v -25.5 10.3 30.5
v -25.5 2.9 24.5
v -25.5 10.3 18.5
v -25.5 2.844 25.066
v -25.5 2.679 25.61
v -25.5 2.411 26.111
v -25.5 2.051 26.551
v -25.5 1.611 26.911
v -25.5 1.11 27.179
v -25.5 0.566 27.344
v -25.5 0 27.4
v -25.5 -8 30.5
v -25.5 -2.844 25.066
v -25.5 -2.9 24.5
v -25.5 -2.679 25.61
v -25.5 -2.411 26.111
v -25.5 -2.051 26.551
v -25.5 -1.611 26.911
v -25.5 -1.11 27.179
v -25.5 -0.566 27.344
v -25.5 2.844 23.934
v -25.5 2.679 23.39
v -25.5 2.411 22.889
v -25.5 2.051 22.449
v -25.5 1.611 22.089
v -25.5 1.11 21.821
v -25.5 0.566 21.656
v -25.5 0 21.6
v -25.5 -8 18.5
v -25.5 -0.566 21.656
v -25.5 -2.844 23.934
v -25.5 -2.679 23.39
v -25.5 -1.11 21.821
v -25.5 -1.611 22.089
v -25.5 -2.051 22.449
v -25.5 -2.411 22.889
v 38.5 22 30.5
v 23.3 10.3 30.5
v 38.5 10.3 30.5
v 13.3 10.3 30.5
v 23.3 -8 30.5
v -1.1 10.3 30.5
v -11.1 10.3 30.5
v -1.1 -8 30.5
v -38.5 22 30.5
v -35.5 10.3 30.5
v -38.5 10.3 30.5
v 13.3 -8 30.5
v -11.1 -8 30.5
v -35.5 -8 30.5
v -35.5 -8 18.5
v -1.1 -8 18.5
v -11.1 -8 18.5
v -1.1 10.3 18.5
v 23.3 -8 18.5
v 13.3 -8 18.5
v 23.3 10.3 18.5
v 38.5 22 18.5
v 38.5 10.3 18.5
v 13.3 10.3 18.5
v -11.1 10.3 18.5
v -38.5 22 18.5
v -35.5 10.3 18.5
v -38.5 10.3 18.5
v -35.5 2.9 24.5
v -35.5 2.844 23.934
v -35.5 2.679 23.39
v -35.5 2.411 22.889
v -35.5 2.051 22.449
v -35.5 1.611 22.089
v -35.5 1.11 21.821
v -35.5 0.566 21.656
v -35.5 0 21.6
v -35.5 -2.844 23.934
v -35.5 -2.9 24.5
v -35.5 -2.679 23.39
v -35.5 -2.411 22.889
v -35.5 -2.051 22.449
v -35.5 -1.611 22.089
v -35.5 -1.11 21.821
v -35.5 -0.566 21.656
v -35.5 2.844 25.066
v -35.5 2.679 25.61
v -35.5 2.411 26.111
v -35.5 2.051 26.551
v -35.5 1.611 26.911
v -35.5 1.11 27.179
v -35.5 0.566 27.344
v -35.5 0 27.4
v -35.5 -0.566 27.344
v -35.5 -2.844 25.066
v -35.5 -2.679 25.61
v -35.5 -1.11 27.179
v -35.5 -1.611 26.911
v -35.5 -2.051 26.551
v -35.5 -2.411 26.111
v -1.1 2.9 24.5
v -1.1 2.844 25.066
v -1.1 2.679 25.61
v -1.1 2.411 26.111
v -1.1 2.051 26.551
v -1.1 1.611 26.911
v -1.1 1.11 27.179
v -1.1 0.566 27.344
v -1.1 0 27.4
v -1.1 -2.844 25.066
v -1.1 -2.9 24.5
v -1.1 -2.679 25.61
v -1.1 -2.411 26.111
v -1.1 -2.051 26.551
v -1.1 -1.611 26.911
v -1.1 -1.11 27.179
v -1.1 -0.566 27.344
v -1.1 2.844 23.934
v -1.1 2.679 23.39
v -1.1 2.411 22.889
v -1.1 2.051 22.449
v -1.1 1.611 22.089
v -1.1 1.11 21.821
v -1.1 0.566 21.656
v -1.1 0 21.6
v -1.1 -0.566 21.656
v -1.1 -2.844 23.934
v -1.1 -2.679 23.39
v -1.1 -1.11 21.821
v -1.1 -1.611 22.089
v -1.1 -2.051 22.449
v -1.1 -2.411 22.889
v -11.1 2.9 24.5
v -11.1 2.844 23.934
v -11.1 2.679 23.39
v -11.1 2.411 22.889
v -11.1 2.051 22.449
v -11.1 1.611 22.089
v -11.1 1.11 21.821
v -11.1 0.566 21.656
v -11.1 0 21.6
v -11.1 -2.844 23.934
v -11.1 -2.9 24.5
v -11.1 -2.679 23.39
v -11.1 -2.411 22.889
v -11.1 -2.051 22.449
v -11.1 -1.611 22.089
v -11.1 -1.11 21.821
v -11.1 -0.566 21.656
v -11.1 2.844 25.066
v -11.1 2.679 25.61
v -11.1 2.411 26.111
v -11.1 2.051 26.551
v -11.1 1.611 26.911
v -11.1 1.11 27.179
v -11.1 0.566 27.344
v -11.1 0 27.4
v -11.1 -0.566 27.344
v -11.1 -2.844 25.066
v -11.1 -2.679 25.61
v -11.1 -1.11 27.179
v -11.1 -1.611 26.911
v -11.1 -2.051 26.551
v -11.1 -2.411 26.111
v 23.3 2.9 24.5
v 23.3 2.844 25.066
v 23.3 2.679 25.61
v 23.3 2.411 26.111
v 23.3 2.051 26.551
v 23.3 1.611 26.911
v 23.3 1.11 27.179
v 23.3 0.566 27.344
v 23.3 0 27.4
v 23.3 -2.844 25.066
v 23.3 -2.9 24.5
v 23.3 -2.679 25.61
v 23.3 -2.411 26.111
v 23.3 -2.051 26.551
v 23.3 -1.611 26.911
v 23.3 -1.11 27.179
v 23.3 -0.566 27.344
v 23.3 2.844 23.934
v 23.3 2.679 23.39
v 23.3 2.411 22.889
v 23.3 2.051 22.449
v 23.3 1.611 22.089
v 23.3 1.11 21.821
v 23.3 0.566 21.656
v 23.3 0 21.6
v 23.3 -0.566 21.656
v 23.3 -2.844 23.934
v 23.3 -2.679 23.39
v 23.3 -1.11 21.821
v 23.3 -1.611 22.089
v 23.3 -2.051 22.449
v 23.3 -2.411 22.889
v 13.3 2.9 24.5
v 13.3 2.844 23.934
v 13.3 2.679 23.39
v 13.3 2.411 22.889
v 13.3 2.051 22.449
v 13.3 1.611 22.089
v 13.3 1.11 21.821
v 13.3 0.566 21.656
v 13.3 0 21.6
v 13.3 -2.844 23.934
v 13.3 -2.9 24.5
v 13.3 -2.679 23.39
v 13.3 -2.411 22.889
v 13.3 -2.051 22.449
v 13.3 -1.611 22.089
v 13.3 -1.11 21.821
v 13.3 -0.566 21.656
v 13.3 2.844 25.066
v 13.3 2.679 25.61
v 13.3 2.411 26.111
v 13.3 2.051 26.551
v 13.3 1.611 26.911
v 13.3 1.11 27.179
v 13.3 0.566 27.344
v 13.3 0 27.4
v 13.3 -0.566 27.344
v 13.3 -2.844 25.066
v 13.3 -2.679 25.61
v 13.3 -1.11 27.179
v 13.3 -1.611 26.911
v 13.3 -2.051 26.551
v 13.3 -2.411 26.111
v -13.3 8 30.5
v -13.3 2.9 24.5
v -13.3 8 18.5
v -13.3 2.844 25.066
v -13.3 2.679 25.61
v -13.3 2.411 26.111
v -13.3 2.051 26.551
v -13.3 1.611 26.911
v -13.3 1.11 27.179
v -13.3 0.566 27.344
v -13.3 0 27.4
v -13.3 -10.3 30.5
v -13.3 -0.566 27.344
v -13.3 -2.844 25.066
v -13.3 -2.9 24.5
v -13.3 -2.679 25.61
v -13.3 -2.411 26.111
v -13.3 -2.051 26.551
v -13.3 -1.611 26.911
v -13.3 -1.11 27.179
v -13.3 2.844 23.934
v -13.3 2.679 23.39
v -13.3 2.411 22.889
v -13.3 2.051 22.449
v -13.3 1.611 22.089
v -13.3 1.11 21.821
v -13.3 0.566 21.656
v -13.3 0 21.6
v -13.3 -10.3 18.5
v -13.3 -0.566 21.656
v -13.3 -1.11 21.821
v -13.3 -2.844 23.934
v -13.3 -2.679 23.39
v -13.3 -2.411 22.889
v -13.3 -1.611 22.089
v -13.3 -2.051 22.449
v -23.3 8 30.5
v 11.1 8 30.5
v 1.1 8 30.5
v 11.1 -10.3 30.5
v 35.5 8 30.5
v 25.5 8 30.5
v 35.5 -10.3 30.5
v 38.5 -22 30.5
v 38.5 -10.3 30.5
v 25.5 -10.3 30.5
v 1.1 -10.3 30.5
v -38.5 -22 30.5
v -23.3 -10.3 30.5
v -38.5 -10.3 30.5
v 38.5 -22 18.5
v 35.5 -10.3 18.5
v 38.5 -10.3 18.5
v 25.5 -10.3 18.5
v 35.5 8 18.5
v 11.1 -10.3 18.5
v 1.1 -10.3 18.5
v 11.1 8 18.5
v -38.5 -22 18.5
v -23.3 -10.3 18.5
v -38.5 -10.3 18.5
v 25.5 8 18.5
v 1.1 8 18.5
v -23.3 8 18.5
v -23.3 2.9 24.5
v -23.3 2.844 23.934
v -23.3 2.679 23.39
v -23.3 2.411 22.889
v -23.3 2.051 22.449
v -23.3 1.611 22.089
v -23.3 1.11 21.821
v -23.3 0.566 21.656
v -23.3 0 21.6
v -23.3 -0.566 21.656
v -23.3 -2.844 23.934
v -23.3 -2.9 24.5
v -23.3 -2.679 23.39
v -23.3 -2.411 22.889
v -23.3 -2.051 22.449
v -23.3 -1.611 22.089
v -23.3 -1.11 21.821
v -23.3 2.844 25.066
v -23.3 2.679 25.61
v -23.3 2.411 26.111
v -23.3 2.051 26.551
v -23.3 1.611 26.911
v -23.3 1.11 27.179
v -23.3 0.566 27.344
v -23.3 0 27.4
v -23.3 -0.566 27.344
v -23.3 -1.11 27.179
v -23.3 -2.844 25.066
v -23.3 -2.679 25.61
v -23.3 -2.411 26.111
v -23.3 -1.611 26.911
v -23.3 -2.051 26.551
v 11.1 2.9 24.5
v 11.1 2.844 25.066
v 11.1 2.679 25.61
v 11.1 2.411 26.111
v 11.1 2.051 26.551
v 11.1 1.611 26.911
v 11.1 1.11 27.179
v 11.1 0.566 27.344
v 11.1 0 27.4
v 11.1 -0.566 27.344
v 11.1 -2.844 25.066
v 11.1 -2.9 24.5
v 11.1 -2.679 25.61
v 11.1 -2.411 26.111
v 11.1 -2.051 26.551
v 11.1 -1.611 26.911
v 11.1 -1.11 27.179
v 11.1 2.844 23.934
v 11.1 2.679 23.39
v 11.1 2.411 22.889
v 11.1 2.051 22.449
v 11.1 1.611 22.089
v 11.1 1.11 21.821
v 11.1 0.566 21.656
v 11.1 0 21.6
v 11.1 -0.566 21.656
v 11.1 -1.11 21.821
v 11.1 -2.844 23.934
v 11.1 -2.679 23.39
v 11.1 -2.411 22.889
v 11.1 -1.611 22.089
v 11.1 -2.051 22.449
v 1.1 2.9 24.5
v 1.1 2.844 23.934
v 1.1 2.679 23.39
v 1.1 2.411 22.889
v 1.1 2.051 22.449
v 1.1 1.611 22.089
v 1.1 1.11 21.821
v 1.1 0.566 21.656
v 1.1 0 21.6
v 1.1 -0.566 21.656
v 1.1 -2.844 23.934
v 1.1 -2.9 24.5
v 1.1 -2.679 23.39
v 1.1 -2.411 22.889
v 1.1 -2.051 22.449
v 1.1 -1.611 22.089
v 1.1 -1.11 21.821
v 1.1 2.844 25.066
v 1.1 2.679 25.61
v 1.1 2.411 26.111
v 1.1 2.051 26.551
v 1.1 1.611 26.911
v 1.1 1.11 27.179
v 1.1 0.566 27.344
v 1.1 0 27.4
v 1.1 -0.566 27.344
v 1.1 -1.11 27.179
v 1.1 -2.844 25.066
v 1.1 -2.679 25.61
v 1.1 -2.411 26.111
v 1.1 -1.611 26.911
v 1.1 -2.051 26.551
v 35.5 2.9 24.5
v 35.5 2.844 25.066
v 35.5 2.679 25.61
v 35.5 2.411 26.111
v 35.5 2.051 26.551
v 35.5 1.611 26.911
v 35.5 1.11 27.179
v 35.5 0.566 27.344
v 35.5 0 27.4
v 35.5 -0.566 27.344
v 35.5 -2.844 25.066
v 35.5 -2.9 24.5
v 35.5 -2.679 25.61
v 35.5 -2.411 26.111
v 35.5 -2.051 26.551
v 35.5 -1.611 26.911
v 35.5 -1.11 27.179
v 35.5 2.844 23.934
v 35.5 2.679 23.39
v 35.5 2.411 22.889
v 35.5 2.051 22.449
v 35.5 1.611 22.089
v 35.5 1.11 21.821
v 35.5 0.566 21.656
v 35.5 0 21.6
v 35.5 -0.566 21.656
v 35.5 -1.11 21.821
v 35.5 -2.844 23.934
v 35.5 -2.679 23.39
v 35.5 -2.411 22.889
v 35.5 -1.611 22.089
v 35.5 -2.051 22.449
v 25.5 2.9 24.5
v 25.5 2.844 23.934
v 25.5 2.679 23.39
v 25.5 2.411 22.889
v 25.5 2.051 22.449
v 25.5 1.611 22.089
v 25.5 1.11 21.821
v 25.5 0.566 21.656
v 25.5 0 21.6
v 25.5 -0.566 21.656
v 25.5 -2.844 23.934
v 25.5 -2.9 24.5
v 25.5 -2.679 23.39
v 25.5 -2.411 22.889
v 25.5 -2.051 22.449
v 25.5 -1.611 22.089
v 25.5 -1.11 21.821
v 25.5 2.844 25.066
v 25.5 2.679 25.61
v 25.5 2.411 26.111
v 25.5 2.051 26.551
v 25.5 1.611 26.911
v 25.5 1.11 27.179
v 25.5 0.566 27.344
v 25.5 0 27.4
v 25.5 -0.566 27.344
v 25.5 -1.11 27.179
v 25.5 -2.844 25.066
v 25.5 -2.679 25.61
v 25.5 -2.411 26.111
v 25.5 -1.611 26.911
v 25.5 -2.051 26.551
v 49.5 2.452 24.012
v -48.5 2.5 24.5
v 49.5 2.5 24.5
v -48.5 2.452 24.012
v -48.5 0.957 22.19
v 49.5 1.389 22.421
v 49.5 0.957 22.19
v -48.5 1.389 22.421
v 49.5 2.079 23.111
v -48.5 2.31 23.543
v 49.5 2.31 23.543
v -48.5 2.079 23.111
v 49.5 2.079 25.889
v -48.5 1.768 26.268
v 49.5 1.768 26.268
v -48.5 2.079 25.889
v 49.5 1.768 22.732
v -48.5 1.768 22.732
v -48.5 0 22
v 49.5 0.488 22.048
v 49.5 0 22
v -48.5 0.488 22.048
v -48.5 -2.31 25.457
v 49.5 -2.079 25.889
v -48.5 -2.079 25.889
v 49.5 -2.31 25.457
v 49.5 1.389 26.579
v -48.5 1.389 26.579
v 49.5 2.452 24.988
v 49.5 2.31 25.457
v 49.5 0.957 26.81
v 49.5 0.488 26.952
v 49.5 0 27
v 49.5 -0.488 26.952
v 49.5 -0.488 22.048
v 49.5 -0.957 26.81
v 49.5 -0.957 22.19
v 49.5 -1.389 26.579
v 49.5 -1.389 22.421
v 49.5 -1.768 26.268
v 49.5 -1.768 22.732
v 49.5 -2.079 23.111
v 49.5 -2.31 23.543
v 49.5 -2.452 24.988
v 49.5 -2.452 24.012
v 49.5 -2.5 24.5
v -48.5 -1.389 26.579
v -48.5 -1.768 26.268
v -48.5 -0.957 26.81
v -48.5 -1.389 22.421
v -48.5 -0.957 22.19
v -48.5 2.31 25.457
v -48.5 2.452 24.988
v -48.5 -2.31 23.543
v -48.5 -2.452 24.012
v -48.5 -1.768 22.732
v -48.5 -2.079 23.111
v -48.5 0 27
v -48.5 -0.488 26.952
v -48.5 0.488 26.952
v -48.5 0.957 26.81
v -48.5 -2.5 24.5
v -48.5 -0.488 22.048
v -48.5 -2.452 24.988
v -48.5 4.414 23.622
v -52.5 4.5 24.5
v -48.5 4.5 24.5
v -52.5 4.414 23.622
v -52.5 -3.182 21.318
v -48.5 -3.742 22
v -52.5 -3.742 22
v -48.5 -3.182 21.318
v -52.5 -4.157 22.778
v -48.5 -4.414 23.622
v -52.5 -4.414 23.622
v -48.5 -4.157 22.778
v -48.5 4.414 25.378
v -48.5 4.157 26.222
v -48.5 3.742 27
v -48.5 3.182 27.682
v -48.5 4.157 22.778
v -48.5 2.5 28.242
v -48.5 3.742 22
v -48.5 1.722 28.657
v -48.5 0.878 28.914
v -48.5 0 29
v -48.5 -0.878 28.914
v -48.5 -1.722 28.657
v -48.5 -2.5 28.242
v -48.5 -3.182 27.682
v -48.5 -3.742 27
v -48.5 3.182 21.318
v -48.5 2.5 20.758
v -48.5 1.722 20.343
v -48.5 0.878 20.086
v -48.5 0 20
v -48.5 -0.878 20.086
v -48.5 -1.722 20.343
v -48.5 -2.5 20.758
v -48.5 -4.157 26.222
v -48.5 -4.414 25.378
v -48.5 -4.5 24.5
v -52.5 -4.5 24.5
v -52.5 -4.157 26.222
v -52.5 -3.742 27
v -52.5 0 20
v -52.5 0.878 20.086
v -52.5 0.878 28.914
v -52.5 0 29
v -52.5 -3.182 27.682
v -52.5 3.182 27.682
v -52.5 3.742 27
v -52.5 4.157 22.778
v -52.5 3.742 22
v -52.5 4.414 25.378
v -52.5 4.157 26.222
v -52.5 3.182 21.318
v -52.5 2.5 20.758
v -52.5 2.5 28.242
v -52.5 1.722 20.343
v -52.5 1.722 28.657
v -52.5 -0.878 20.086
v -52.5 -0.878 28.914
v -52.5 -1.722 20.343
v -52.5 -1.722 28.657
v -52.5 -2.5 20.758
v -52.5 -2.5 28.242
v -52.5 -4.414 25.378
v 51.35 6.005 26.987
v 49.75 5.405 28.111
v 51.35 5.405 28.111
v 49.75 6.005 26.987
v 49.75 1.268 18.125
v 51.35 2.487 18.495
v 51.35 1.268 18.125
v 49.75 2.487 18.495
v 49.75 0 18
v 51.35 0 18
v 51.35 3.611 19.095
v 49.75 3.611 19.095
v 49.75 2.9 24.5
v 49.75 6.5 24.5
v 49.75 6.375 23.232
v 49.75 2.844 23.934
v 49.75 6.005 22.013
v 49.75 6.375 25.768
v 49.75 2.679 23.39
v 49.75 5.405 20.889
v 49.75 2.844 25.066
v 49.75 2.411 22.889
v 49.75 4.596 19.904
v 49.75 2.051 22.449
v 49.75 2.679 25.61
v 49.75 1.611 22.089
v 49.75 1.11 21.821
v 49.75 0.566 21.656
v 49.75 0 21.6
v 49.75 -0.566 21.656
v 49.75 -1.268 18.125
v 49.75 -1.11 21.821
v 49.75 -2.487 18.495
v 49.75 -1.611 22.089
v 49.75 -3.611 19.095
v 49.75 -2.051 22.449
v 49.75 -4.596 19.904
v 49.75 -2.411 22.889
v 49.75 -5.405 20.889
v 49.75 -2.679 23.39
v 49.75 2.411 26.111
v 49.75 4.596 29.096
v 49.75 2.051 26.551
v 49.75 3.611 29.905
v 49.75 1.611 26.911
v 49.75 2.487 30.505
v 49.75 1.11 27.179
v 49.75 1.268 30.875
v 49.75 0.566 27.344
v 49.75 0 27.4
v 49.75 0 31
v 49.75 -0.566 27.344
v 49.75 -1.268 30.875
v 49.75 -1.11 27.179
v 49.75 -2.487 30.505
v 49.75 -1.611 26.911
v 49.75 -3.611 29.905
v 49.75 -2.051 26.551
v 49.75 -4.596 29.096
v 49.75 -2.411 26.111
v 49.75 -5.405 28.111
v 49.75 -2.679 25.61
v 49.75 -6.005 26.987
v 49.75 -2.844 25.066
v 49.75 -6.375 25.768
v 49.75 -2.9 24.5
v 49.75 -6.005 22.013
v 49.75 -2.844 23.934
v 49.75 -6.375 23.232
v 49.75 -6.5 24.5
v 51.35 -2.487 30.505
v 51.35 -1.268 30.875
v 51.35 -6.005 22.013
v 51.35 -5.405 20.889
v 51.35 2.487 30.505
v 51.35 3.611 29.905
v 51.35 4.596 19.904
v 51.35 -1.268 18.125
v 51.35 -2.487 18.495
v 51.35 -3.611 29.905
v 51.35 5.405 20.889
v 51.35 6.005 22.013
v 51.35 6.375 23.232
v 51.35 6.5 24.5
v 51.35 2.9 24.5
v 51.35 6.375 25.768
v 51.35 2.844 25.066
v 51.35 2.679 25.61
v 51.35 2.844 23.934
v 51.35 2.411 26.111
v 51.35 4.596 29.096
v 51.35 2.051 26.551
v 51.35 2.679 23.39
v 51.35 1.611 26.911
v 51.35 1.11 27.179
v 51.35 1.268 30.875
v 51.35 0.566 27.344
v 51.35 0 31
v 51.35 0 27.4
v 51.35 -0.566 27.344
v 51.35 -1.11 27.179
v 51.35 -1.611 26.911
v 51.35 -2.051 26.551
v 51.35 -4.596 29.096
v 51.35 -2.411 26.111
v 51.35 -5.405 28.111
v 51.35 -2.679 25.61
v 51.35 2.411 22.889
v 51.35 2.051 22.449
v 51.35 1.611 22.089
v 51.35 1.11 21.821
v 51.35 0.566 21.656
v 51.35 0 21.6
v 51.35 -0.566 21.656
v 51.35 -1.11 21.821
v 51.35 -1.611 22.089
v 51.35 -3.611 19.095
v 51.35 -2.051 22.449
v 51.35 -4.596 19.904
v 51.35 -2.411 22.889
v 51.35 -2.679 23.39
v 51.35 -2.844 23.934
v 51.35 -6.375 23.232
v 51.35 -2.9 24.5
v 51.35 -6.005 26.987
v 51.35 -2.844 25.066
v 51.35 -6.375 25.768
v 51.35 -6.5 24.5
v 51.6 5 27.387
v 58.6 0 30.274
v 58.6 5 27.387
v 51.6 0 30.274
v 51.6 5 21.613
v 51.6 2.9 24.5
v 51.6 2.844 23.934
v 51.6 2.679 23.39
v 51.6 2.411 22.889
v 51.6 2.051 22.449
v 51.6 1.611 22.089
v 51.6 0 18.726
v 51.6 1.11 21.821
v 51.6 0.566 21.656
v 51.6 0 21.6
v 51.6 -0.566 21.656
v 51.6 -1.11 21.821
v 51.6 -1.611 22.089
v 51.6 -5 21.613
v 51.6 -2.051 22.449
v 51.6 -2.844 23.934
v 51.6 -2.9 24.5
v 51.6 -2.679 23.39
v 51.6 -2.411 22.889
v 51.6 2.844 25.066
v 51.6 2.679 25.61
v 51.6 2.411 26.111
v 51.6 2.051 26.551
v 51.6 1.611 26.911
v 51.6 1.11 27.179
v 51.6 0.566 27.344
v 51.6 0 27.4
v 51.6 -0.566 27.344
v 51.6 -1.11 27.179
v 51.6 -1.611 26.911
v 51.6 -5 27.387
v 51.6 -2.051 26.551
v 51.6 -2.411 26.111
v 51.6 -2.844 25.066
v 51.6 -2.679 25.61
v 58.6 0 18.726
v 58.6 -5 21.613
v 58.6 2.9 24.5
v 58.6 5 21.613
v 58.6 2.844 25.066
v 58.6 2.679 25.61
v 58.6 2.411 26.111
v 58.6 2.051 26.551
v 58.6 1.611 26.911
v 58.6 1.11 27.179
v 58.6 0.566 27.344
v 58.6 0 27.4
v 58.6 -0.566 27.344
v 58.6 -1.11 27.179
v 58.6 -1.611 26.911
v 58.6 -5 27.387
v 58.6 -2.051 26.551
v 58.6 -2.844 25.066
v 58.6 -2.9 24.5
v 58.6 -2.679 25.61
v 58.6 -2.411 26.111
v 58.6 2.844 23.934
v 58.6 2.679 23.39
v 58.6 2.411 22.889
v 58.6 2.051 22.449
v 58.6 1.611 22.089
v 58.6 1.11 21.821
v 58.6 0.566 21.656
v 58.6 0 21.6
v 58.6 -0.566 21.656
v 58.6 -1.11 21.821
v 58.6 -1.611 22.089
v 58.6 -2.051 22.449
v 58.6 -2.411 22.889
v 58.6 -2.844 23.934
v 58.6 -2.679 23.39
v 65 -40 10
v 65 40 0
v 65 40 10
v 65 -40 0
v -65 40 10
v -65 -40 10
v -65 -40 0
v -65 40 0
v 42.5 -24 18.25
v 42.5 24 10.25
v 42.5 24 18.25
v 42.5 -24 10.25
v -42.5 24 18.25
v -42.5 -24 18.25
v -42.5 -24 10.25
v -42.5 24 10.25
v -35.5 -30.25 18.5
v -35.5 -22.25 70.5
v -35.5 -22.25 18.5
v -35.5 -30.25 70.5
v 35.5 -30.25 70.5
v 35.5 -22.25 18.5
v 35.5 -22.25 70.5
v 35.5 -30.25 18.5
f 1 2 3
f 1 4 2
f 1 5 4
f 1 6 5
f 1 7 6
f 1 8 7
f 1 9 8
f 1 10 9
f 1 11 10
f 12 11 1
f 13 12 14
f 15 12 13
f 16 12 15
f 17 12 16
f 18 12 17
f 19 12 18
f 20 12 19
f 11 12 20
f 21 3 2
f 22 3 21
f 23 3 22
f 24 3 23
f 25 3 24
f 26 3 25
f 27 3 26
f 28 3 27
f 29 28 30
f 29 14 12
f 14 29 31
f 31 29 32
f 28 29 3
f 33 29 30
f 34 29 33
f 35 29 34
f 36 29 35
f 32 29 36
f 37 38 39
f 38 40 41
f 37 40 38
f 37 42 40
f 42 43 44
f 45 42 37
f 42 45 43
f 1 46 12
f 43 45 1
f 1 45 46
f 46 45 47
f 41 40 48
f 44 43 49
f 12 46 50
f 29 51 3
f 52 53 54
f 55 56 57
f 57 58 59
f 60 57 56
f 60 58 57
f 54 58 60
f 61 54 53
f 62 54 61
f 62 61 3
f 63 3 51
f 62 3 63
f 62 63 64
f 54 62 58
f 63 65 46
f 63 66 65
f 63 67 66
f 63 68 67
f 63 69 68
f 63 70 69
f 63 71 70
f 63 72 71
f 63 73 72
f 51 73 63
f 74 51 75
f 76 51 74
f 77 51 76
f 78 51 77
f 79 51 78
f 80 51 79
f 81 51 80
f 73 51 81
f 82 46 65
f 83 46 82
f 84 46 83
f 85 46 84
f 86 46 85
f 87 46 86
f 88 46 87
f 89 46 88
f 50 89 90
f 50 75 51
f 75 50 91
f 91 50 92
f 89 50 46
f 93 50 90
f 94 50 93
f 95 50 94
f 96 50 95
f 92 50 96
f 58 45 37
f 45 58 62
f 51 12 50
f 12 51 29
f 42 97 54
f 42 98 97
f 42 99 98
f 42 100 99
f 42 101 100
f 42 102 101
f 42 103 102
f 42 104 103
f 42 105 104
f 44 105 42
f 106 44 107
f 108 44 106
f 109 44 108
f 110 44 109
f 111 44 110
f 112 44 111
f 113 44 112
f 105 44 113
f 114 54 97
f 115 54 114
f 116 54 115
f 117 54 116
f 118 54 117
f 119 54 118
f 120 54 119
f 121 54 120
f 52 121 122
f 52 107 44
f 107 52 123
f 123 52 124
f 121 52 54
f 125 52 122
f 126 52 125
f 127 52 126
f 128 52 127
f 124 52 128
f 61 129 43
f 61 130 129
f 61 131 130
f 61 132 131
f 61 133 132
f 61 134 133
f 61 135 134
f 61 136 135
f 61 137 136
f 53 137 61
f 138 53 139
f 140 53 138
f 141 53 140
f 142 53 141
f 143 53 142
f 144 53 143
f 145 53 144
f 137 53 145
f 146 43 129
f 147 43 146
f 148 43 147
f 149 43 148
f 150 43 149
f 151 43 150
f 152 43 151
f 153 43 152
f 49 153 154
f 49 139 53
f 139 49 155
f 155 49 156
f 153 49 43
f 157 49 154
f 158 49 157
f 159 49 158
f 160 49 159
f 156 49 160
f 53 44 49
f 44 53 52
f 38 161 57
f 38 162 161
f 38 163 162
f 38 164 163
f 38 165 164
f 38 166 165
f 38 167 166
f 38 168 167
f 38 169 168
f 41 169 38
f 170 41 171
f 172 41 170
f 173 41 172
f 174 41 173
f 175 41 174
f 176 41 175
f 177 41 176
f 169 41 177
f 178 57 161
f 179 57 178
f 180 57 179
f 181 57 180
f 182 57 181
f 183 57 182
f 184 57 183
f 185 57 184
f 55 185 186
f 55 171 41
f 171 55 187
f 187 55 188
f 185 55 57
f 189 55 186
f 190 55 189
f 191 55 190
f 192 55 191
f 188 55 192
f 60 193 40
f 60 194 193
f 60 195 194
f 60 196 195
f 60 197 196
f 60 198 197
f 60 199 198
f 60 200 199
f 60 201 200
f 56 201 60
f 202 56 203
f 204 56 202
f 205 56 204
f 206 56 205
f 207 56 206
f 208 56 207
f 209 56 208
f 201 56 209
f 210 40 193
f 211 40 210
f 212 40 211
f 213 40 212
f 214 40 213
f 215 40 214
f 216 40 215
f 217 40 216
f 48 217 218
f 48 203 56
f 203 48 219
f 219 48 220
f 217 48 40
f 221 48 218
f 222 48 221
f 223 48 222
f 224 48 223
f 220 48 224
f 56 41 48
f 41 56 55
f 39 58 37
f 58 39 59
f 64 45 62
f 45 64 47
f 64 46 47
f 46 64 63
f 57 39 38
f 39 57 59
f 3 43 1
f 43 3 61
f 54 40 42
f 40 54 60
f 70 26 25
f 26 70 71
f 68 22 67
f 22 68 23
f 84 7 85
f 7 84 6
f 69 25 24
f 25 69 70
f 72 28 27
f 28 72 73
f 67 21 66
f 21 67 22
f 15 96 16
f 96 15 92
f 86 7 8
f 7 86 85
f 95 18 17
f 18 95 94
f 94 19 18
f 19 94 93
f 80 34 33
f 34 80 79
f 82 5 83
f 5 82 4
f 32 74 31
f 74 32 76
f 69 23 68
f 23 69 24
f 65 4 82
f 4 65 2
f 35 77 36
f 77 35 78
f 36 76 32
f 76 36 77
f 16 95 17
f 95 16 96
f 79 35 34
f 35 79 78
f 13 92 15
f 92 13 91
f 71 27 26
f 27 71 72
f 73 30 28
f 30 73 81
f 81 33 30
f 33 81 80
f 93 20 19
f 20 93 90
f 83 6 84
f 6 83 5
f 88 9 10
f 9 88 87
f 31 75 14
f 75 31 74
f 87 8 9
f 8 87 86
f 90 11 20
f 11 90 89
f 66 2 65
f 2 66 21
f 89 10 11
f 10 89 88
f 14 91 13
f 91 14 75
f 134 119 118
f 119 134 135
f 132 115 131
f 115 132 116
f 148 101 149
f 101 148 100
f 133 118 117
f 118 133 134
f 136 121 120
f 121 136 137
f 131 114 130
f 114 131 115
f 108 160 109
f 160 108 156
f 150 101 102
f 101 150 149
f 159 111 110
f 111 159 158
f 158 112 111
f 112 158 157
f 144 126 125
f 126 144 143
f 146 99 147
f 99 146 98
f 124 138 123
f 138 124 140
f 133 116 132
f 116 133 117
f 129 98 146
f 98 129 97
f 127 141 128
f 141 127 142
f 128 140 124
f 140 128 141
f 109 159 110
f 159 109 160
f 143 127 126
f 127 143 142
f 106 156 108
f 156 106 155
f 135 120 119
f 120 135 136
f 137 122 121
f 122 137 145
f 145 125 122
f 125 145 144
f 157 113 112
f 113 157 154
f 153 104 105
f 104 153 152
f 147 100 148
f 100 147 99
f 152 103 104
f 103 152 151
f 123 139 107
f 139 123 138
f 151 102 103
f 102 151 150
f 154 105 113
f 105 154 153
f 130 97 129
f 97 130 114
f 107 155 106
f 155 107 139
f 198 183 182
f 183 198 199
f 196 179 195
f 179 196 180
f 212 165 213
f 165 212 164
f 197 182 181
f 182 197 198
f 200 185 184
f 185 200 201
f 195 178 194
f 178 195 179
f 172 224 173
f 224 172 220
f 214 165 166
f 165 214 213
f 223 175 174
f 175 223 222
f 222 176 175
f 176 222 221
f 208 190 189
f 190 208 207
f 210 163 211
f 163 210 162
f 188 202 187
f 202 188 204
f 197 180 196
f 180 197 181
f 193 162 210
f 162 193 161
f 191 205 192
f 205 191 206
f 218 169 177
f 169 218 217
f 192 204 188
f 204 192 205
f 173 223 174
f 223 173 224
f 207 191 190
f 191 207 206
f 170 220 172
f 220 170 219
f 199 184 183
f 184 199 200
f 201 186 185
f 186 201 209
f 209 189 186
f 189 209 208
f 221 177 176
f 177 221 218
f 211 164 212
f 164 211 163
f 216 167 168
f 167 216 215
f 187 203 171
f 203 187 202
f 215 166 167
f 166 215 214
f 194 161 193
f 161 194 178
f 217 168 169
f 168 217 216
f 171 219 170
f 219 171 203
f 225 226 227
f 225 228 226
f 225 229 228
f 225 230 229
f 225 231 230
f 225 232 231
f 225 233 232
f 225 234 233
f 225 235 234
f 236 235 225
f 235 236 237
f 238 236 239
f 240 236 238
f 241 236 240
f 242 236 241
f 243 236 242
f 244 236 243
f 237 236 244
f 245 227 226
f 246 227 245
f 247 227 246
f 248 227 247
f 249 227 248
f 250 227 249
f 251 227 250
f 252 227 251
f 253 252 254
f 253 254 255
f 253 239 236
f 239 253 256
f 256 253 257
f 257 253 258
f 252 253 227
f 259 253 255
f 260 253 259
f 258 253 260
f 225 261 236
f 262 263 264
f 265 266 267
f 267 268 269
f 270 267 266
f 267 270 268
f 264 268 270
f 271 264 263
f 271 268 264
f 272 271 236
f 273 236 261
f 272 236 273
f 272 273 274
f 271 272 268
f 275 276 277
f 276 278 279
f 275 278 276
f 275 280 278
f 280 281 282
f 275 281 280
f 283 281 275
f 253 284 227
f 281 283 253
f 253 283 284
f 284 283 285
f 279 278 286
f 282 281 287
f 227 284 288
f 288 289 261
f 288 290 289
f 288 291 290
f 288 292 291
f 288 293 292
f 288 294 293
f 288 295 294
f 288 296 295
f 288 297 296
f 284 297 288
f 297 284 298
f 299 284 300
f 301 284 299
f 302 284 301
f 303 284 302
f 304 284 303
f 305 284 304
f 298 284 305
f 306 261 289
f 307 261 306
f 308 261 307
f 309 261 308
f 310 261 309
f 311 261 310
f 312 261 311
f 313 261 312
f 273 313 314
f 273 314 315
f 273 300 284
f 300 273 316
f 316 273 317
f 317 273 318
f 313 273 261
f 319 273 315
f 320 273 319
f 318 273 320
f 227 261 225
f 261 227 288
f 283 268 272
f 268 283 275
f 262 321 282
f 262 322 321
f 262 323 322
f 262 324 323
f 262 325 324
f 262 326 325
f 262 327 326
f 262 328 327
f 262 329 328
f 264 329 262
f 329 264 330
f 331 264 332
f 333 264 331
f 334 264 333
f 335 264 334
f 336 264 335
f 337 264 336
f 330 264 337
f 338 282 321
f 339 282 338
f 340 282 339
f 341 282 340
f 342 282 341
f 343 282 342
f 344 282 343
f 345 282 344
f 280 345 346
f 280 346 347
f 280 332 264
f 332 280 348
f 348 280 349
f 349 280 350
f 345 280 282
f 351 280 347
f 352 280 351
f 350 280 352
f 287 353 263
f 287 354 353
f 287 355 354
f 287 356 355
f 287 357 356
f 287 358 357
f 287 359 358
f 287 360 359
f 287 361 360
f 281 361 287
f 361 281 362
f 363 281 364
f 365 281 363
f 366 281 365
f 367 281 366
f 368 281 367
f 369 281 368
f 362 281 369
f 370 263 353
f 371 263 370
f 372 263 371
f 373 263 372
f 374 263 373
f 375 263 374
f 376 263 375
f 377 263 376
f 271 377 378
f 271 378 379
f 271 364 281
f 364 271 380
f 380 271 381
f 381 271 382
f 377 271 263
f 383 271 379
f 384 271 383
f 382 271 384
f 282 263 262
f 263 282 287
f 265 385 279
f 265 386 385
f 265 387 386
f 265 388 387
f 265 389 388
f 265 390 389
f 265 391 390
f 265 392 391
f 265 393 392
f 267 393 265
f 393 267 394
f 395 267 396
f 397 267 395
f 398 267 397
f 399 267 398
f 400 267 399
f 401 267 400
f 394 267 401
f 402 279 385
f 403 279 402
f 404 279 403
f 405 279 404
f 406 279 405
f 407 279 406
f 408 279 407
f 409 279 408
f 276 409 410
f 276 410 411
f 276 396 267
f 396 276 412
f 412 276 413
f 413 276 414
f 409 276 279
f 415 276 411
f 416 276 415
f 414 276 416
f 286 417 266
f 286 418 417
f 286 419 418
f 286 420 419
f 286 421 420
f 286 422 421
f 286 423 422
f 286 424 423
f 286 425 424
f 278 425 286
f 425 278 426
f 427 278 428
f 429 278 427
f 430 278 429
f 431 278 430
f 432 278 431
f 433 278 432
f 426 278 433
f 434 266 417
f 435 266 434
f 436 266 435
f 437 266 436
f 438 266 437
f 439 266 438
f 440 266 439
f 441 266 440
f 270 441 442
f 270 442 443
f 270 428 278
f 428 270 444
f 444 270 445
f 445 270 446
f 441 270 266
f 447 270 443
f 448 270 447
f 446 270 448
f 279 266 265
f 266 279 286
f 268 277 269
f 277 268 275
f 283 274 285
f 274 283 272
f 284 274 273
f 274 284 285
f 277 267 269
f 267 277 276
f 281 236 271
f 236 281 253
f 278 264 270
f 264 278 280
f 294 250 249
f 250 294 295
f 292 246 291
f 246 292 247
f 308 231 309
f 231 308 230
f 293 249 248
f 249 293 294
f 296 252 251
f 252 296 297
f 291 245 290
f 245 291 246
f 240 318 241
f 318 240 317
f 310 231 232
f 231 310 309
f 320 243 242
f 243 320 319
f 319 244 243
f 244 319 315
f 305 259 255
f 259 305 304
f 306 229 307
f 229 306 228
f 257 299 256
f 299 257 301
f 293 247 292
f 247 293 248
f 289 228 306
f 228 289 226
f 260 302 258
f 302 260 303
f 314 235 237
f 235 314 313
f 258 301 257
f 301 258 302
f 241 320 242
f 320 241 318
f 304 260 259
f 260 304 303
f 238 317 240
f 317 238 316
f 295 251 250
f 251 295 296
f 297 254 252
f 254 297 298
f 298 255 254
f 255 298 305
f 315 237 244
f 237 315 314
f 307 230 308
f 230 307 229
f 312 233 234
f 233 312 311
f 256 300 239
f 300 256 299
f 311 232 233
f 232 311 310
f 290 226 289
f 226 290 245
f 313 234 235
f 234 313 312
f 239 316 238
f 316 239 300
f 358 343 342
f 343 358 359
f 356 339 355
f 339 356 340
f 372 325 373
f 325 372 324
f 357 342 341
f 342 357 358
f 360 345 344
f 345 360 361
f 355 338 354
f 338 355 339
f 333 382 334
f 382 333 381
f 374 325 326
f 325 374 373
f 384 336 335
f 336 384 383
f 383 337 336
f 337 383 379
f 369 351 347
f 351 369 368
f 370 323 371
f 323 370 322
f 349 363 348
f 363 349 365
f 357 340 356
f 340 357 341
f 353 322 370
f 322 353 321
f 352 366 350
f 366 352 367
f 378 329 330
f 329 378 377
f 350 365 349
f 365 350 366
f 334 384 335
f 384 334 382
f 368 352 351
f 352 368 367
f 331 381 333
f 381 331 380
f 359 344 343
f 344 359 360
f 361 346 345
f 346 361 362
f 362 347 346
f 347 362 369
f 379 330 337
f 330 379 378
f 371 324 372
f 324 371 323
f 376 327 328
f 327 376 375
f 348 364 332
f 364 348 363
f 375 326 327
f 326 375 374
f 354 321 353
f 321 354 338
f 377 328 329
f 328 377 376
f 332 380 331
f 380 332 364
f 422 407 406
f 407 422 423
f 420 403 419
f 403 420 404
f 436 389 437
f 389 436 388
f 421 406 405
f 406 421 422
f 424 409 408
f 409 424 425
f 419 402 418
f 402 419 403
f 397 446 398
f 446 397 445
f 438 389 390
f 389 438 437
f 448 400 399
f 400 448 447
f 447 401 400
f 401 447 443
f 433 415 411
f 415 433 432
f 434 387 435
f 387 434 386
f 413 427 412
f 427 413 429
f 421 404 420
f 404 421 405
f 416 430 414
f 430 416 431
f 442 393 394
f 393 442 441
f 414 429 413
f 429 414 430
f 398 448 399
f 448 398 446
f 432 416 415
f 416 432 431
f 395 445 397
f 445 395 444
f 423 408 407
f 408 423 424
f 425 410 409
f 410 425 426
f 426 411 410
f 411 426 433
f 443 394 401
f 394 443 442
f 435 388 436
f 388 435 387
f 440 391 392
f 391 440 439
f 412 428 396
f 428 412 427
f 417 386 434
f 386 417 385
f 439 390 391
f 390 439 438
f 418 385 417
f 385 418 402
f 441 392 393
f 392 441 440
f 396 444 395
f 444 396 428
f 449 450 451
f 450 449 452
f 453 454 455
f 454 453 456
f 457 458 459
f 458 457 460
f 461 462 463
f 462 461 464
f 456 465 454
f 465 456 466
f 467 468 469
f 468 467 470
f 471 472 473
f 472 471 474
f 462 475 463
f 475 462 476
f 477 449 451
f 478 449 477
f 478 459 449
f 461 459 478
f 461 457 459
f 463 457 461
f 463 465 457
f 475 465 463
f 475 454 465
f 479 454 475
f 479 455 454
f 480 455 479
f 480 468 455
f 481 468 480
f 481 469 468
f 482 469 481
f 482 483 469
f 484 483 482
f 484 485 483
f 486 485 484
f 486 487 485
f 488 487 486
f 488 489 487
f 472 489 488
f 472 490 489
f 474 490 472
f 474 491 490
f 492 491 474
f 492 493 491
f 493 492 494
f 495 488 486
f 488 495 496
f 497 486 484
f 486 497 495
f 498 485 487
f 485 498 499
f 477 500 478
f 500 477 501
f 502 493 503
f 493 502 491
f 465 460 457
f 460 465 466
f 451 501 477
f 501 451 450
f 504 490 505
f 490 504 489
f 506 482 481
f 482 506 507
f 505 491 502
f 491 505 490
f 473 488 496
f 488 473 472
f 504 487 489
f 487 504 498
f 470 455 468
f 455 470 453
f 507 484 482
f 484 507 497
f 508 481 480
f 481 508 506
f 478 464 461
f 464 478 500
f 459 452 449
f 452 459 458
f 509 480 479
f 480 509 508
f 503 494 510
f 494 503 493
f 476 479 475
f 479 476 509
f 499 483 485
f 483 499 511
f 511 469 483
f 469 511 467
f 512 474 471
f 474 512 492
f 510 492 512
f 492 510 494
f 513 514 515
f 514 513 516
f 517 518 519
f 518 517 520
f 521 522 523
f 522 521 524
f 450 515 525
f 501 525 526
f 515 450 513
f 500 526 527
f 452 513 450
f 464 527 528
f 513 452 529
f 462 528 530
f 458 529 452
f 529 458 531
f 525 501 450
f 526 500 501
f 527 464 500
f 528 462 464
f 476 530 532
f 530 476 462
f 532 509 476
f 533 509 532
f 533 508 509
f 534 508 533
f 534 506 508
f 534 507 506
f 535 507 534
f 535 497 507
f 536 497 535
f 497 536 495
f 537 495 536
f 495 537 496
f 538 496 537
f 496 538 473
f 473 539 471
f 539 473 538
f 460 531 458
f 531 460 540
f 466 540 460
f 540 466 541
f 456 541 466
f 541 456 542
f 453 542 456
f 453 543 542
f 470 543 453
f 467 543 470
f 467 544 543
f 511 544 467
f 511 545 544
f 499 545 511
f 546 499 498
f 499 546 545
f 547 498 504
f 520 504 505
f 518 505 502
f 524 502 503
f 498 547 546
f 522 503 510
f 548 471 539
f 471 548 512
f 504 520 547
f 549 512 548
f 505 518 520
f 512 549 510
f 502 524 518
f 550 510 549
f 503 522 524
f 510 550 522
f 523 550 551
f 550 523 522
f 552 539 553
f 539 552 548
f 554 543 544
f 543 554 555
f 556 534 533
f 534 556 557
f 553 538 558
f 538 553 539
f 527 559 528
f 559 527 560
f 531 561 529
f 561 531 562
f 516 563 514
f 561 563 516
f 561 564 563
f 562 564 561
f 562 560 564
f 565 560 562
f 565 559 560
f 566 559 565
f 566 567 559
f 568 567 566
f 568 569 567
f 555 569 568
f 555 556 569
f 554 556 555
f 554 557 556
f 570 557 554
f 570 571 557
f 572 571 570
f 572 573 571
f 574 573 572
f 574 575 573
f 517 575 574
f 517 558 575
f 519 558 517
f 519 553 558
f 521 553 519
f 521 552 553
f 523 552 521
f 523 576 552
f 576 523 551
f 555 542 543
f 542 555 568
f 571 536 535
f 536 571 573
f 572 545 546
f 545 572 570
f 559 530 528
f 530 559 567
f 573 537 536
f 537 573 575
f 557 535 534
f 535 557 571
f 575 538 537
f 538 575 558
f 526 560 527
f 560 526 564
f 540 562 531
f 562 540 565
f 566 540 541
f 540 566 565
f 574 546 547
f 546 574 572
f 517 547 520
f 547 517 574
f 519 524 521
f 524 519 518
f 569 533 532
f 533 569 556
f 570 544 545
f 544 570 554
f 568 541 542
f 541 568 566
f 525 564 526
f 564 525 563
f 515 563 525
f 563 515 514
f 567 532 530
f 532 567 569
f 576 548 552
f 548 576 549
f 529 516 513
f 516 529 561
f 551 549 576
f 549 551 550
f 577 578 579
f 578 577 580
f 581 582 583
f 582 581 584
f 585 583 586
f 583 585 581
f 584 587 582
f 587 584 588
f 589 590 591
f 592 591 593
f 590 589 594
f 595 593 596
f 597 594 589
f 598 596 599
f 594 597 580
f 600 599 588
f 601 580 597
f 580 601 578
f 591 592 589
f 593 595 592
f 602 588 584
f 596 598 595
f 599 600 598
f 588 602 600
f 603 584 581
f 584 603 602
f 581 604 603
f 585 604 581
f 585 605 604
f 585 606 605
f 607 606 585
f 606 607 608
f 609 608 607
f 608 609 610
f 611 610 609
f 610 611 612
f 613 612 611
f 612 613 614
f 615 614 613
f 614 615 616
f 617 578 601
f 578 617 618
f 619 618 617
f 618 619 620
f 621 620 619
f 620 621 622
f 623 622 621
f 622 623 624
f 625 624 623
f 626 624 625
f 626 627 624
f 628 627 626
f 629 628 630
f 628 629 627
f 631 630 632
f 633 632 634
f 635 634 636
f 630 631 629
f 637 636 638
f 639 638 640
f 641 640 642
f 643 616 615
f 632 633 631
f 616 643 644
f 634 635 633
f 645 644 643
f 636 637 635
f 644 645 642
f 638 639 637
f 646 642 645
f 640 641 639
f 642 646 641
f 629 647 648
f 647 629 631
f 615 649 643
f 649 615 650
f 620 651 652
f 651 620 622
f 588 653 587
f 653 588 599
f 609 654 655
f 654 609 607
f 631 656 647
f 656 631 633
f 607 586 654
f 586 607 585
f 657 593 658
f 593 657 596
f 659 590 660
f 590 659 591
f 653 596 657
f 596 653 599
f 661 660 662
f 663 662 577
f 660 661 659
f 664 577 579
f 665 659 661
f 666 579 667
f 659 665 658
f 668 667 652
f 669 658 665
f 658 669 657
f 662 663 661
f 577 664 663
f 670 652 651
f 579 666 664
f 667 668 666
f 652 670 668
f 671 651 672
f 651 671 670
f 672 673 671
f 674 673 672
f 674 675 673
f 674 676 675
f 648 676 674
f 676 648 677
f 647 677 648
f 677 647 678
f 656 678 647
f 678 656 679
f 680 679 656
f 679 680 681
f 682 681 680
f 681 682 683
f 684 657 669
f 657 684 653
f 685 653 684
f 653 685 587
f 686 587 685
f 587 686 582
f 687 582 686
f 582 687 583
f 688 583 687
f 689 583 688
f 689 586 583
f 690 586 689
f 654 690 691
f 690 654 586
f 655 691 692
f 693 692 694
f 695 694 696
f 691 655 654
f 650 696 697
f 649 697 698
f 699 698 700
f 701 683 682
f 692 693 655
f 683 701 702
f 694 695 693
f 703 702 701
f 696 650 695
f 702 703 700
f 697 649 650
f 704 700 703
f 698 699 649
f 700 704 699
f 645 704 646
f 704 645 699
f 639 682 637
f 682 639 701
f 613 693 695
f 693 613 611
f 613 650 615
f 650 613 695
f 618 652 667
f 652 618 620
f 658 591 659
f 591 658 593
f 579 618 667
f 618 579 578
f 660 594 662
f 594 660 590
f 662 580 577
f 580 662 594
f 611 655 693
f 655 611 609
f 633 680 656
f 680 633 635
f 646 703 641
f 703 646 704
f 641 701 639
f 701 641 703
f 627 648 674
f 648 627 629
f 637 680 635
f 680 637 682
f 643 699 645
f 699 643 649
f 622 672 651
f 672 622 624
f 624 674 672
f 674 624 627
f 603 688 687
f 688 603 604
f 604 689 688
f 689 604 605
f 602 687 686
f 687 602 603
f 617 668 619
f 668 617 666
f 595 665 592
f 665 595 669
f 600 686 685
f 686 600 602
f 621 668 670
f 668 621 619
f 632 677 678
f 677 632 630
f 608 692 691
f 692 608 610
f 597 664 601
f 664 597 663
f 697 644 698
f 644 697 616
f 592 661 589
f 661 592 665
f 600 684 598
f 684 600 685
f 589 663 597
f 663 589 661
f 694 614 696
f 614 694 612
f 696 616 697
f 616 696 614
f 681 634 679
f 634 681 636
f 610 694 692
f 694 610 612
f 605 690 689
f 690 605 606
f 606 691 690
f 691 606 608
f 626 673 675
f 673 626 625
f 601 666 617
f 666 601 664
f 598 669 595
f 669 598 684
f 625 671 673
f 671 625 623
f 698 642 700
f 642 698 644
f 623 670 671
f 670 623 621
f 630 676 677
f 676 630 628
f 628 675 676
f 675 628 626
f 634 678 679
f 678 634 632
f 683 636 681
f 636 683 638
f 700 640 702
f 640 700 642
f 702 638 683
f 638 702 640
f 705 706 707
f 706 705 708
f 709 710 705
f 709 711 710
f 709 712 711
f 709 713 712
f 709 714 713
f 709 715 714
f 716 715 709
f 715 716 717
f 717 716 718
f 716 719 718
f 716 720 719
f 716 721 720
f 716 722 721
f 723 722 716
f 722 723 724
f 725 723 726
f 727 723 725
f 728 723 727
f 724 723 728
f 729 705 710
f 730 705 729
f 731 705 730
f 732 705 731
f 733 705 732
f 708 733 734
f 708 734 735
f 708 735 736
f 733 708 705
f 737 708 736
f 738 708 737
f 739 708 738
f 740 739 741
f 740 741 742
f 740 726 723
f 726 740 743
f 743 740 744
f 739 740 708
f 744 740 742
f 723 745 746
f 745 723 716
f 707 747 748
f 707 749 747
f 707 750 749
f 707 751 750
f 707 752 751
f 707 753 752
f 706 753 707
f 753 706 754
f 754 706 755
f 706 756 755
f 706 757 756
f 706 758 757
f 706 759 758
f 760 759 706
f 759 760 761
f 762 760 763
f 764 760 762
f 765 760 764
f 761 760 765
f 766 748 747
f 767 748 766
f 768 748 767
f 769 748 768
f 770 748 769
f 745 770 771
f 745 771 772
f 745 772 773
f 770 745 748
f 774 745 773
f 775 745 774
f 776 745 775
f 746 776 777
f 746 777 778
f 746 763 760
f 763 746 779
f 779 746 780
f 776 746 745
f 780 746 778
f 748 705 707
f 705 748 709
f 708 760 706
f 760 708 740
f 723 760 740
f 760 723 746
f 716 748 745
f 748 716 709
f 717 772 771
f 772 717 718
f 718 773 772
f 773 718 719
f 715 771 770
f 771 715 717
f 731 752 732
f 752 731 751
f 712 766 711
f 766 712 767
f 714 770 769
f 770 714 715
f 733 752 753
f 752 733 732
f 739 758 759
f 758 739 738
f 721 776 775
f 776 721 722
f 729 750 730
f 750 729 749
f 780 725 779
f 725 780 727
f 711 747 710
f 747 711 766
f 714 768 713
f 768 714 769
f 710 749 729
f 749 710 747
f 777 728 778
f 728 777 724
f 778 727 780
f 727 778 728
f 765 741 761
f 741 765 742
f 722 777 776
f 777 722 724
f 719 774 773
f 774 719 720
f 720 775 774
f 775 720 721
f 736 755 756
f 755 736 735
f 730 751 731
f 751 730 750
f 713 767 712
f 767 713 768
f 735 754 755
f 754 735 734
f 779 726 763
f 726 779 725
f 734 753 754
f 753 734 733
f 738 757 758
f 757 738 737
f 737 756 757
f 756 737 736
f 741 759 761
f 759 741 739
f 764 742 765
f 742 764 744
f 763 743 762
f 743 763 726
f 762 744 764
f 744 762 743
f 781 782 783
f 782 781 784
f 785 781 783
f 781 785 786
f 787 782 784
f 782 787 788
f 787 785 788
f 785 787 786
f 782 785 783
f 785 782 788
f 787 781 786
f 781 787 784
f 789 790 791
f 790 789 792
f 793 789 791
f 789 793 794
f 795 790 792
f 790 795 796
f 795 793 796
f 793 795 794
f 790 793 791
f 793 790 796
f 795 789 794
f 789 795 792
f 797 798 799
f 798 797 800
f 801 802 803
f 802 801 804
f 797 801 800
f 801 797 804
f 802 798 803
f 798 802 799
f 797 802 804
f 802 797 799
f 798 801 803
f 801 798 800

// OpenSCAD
$fn = 32;

// ------------------------------------------------------------------------
// Comb hinge with flap: leaf 77 x 22 mm, pin d5, flap 52 mm
// Every part is its own module, assembly() places every instance.
// ------------------------------------------------------------------------

// --- part 1 ---
module hinge_bed() {
  difference() {
    translate([-65, -40, 0]) cube([130, 80, 10]);
  }
}

// --- part 2 ---
module hinge_riser() {
  difference() {
    translate([-42.5, -24, 0]) cube([85, 48, 8]);
  }
}

// --- part 3 ---
module hinge_leaf_a() {
  difference() {
    union() {
      translate([-35.5, -8, -6]) cube([10, 30, 12]);
      translate([-11.1, -8, -6]) cube([10, 30, 12]);
      translate([13.3, -8, -6]) cube([10, 30, 12]);
      translate([-38.5, 10.3, -6]) cube([77, 11.7, 12]);
    }
    translate([-30.5, 0, 0]) rotate([0, 90, 0]) cylinder(h = 12, d = 5.8, center = true);
    translate([-6.1, 0, 0]) rotate([0, 90, 0]) cylinder(h = 12, d = 5.8, center = true);
    translate([18.3, 0, 0]) rotate([0, 90, 0]) cylinder(h = 12, d = 5.8, center = true);
  }
}

// --- part 4 ---
module hinge_leaf_b() {
  difference() {
    union() {
      translate([-23.3, -22, -6]) cube([10, 30, 12]);
      translate([1.1, -22, -6]) cube([10, 30, 12]);
      translate([25.5, -22, -6]) cube([10, 30, 12]);
      translate([-38.5, -22, -6]) cube([77, 11.7, 12]);
    }
    translate([-18.3, 0, 0]) rotate([0, 90, 0]) cylinder(h = 12, d = 5.8, center = true);
    translate([6.1, 0, 0]) rotate([0, 90, 0]) cylinder(h = 12, d = 5.8, center = true);
    translate([30.5, 0, 0]) rotate([0, 90, 0]) cylinder(h = 12, d = 5.8, center = true);
  }
}

// --- part 5 ---
module hinge_flap() {
  difference() {
    translate([-35.5, -26, 0]) cube([71, 52, 8]);
  }
}

// --- part 6 ---
module hinge_pin() {
  rotate([0, 90, 0]) cylinder(h = 99, d = 5, center = true);
  translate([-52.5, 0, 0]) rotate([0, 90, 0]) cylinder(h = 4, d = 9);
}

// --- part 7 ---
module pin_washer() {
  difference() {
      translate([0, 0, 0]) cylinder(h = 1.6, d = 13);
      translate([0, 0, -1]) cylinder(h = 3.6, d = 5.8);
    }
}

// --- part 8 ---
module pin_nut() {
  difference() {
    linear_extrude(height = 7) polygon(points = [[5.774, 0], [2.887, 5], [-2.887, 5], [-5.774, 0], [-2.887, -5], [2.887, -5]]);
    translate([0, 0, -1]) cylinder(h = 9, d = 5.8);
  }
}

// --- assembly ---
module assembly() {
  color([0.80, 0.24, 0.20]) translate([0, 0, 0]) rotate([0, 0, 0]) hinge_bed();
  color([0.20, 0.45, 0.75]) translate([0, 0, 10.25]) rotate([0, 0, 0]) hinge_riser();
  color([0.25, 0.62, 0.32]) translate([0, 0, 24.5]) rotate([0, 0, 0]) hinge_leaf_a();
  color([0.92, 0.70, 0.18]) translate([0, 0, 24.5]) rotate([0, 0, 0]) hinge_leaf_b();
  color([0.58, 0.35, 0.70]) translate([0, -22.25, 44.5]) rotate([90, 0, 0]) hinge_flap();
  color([0.16, 0.66, 0.66]) translate([0, 0, 24.5]) rotate([0, 0, 0]) hinge_pin();
  color([0.85, 0.48, 0.18]) translate([49.75, 0, 24.5]) rotate([0, 90, 0]) pin_washer();
  color([0.55, 0.60, 0.65]) translate([51.6, 0, 24.5]) rotate([0, 90, 0]) pin_nut();
}

assembly();
